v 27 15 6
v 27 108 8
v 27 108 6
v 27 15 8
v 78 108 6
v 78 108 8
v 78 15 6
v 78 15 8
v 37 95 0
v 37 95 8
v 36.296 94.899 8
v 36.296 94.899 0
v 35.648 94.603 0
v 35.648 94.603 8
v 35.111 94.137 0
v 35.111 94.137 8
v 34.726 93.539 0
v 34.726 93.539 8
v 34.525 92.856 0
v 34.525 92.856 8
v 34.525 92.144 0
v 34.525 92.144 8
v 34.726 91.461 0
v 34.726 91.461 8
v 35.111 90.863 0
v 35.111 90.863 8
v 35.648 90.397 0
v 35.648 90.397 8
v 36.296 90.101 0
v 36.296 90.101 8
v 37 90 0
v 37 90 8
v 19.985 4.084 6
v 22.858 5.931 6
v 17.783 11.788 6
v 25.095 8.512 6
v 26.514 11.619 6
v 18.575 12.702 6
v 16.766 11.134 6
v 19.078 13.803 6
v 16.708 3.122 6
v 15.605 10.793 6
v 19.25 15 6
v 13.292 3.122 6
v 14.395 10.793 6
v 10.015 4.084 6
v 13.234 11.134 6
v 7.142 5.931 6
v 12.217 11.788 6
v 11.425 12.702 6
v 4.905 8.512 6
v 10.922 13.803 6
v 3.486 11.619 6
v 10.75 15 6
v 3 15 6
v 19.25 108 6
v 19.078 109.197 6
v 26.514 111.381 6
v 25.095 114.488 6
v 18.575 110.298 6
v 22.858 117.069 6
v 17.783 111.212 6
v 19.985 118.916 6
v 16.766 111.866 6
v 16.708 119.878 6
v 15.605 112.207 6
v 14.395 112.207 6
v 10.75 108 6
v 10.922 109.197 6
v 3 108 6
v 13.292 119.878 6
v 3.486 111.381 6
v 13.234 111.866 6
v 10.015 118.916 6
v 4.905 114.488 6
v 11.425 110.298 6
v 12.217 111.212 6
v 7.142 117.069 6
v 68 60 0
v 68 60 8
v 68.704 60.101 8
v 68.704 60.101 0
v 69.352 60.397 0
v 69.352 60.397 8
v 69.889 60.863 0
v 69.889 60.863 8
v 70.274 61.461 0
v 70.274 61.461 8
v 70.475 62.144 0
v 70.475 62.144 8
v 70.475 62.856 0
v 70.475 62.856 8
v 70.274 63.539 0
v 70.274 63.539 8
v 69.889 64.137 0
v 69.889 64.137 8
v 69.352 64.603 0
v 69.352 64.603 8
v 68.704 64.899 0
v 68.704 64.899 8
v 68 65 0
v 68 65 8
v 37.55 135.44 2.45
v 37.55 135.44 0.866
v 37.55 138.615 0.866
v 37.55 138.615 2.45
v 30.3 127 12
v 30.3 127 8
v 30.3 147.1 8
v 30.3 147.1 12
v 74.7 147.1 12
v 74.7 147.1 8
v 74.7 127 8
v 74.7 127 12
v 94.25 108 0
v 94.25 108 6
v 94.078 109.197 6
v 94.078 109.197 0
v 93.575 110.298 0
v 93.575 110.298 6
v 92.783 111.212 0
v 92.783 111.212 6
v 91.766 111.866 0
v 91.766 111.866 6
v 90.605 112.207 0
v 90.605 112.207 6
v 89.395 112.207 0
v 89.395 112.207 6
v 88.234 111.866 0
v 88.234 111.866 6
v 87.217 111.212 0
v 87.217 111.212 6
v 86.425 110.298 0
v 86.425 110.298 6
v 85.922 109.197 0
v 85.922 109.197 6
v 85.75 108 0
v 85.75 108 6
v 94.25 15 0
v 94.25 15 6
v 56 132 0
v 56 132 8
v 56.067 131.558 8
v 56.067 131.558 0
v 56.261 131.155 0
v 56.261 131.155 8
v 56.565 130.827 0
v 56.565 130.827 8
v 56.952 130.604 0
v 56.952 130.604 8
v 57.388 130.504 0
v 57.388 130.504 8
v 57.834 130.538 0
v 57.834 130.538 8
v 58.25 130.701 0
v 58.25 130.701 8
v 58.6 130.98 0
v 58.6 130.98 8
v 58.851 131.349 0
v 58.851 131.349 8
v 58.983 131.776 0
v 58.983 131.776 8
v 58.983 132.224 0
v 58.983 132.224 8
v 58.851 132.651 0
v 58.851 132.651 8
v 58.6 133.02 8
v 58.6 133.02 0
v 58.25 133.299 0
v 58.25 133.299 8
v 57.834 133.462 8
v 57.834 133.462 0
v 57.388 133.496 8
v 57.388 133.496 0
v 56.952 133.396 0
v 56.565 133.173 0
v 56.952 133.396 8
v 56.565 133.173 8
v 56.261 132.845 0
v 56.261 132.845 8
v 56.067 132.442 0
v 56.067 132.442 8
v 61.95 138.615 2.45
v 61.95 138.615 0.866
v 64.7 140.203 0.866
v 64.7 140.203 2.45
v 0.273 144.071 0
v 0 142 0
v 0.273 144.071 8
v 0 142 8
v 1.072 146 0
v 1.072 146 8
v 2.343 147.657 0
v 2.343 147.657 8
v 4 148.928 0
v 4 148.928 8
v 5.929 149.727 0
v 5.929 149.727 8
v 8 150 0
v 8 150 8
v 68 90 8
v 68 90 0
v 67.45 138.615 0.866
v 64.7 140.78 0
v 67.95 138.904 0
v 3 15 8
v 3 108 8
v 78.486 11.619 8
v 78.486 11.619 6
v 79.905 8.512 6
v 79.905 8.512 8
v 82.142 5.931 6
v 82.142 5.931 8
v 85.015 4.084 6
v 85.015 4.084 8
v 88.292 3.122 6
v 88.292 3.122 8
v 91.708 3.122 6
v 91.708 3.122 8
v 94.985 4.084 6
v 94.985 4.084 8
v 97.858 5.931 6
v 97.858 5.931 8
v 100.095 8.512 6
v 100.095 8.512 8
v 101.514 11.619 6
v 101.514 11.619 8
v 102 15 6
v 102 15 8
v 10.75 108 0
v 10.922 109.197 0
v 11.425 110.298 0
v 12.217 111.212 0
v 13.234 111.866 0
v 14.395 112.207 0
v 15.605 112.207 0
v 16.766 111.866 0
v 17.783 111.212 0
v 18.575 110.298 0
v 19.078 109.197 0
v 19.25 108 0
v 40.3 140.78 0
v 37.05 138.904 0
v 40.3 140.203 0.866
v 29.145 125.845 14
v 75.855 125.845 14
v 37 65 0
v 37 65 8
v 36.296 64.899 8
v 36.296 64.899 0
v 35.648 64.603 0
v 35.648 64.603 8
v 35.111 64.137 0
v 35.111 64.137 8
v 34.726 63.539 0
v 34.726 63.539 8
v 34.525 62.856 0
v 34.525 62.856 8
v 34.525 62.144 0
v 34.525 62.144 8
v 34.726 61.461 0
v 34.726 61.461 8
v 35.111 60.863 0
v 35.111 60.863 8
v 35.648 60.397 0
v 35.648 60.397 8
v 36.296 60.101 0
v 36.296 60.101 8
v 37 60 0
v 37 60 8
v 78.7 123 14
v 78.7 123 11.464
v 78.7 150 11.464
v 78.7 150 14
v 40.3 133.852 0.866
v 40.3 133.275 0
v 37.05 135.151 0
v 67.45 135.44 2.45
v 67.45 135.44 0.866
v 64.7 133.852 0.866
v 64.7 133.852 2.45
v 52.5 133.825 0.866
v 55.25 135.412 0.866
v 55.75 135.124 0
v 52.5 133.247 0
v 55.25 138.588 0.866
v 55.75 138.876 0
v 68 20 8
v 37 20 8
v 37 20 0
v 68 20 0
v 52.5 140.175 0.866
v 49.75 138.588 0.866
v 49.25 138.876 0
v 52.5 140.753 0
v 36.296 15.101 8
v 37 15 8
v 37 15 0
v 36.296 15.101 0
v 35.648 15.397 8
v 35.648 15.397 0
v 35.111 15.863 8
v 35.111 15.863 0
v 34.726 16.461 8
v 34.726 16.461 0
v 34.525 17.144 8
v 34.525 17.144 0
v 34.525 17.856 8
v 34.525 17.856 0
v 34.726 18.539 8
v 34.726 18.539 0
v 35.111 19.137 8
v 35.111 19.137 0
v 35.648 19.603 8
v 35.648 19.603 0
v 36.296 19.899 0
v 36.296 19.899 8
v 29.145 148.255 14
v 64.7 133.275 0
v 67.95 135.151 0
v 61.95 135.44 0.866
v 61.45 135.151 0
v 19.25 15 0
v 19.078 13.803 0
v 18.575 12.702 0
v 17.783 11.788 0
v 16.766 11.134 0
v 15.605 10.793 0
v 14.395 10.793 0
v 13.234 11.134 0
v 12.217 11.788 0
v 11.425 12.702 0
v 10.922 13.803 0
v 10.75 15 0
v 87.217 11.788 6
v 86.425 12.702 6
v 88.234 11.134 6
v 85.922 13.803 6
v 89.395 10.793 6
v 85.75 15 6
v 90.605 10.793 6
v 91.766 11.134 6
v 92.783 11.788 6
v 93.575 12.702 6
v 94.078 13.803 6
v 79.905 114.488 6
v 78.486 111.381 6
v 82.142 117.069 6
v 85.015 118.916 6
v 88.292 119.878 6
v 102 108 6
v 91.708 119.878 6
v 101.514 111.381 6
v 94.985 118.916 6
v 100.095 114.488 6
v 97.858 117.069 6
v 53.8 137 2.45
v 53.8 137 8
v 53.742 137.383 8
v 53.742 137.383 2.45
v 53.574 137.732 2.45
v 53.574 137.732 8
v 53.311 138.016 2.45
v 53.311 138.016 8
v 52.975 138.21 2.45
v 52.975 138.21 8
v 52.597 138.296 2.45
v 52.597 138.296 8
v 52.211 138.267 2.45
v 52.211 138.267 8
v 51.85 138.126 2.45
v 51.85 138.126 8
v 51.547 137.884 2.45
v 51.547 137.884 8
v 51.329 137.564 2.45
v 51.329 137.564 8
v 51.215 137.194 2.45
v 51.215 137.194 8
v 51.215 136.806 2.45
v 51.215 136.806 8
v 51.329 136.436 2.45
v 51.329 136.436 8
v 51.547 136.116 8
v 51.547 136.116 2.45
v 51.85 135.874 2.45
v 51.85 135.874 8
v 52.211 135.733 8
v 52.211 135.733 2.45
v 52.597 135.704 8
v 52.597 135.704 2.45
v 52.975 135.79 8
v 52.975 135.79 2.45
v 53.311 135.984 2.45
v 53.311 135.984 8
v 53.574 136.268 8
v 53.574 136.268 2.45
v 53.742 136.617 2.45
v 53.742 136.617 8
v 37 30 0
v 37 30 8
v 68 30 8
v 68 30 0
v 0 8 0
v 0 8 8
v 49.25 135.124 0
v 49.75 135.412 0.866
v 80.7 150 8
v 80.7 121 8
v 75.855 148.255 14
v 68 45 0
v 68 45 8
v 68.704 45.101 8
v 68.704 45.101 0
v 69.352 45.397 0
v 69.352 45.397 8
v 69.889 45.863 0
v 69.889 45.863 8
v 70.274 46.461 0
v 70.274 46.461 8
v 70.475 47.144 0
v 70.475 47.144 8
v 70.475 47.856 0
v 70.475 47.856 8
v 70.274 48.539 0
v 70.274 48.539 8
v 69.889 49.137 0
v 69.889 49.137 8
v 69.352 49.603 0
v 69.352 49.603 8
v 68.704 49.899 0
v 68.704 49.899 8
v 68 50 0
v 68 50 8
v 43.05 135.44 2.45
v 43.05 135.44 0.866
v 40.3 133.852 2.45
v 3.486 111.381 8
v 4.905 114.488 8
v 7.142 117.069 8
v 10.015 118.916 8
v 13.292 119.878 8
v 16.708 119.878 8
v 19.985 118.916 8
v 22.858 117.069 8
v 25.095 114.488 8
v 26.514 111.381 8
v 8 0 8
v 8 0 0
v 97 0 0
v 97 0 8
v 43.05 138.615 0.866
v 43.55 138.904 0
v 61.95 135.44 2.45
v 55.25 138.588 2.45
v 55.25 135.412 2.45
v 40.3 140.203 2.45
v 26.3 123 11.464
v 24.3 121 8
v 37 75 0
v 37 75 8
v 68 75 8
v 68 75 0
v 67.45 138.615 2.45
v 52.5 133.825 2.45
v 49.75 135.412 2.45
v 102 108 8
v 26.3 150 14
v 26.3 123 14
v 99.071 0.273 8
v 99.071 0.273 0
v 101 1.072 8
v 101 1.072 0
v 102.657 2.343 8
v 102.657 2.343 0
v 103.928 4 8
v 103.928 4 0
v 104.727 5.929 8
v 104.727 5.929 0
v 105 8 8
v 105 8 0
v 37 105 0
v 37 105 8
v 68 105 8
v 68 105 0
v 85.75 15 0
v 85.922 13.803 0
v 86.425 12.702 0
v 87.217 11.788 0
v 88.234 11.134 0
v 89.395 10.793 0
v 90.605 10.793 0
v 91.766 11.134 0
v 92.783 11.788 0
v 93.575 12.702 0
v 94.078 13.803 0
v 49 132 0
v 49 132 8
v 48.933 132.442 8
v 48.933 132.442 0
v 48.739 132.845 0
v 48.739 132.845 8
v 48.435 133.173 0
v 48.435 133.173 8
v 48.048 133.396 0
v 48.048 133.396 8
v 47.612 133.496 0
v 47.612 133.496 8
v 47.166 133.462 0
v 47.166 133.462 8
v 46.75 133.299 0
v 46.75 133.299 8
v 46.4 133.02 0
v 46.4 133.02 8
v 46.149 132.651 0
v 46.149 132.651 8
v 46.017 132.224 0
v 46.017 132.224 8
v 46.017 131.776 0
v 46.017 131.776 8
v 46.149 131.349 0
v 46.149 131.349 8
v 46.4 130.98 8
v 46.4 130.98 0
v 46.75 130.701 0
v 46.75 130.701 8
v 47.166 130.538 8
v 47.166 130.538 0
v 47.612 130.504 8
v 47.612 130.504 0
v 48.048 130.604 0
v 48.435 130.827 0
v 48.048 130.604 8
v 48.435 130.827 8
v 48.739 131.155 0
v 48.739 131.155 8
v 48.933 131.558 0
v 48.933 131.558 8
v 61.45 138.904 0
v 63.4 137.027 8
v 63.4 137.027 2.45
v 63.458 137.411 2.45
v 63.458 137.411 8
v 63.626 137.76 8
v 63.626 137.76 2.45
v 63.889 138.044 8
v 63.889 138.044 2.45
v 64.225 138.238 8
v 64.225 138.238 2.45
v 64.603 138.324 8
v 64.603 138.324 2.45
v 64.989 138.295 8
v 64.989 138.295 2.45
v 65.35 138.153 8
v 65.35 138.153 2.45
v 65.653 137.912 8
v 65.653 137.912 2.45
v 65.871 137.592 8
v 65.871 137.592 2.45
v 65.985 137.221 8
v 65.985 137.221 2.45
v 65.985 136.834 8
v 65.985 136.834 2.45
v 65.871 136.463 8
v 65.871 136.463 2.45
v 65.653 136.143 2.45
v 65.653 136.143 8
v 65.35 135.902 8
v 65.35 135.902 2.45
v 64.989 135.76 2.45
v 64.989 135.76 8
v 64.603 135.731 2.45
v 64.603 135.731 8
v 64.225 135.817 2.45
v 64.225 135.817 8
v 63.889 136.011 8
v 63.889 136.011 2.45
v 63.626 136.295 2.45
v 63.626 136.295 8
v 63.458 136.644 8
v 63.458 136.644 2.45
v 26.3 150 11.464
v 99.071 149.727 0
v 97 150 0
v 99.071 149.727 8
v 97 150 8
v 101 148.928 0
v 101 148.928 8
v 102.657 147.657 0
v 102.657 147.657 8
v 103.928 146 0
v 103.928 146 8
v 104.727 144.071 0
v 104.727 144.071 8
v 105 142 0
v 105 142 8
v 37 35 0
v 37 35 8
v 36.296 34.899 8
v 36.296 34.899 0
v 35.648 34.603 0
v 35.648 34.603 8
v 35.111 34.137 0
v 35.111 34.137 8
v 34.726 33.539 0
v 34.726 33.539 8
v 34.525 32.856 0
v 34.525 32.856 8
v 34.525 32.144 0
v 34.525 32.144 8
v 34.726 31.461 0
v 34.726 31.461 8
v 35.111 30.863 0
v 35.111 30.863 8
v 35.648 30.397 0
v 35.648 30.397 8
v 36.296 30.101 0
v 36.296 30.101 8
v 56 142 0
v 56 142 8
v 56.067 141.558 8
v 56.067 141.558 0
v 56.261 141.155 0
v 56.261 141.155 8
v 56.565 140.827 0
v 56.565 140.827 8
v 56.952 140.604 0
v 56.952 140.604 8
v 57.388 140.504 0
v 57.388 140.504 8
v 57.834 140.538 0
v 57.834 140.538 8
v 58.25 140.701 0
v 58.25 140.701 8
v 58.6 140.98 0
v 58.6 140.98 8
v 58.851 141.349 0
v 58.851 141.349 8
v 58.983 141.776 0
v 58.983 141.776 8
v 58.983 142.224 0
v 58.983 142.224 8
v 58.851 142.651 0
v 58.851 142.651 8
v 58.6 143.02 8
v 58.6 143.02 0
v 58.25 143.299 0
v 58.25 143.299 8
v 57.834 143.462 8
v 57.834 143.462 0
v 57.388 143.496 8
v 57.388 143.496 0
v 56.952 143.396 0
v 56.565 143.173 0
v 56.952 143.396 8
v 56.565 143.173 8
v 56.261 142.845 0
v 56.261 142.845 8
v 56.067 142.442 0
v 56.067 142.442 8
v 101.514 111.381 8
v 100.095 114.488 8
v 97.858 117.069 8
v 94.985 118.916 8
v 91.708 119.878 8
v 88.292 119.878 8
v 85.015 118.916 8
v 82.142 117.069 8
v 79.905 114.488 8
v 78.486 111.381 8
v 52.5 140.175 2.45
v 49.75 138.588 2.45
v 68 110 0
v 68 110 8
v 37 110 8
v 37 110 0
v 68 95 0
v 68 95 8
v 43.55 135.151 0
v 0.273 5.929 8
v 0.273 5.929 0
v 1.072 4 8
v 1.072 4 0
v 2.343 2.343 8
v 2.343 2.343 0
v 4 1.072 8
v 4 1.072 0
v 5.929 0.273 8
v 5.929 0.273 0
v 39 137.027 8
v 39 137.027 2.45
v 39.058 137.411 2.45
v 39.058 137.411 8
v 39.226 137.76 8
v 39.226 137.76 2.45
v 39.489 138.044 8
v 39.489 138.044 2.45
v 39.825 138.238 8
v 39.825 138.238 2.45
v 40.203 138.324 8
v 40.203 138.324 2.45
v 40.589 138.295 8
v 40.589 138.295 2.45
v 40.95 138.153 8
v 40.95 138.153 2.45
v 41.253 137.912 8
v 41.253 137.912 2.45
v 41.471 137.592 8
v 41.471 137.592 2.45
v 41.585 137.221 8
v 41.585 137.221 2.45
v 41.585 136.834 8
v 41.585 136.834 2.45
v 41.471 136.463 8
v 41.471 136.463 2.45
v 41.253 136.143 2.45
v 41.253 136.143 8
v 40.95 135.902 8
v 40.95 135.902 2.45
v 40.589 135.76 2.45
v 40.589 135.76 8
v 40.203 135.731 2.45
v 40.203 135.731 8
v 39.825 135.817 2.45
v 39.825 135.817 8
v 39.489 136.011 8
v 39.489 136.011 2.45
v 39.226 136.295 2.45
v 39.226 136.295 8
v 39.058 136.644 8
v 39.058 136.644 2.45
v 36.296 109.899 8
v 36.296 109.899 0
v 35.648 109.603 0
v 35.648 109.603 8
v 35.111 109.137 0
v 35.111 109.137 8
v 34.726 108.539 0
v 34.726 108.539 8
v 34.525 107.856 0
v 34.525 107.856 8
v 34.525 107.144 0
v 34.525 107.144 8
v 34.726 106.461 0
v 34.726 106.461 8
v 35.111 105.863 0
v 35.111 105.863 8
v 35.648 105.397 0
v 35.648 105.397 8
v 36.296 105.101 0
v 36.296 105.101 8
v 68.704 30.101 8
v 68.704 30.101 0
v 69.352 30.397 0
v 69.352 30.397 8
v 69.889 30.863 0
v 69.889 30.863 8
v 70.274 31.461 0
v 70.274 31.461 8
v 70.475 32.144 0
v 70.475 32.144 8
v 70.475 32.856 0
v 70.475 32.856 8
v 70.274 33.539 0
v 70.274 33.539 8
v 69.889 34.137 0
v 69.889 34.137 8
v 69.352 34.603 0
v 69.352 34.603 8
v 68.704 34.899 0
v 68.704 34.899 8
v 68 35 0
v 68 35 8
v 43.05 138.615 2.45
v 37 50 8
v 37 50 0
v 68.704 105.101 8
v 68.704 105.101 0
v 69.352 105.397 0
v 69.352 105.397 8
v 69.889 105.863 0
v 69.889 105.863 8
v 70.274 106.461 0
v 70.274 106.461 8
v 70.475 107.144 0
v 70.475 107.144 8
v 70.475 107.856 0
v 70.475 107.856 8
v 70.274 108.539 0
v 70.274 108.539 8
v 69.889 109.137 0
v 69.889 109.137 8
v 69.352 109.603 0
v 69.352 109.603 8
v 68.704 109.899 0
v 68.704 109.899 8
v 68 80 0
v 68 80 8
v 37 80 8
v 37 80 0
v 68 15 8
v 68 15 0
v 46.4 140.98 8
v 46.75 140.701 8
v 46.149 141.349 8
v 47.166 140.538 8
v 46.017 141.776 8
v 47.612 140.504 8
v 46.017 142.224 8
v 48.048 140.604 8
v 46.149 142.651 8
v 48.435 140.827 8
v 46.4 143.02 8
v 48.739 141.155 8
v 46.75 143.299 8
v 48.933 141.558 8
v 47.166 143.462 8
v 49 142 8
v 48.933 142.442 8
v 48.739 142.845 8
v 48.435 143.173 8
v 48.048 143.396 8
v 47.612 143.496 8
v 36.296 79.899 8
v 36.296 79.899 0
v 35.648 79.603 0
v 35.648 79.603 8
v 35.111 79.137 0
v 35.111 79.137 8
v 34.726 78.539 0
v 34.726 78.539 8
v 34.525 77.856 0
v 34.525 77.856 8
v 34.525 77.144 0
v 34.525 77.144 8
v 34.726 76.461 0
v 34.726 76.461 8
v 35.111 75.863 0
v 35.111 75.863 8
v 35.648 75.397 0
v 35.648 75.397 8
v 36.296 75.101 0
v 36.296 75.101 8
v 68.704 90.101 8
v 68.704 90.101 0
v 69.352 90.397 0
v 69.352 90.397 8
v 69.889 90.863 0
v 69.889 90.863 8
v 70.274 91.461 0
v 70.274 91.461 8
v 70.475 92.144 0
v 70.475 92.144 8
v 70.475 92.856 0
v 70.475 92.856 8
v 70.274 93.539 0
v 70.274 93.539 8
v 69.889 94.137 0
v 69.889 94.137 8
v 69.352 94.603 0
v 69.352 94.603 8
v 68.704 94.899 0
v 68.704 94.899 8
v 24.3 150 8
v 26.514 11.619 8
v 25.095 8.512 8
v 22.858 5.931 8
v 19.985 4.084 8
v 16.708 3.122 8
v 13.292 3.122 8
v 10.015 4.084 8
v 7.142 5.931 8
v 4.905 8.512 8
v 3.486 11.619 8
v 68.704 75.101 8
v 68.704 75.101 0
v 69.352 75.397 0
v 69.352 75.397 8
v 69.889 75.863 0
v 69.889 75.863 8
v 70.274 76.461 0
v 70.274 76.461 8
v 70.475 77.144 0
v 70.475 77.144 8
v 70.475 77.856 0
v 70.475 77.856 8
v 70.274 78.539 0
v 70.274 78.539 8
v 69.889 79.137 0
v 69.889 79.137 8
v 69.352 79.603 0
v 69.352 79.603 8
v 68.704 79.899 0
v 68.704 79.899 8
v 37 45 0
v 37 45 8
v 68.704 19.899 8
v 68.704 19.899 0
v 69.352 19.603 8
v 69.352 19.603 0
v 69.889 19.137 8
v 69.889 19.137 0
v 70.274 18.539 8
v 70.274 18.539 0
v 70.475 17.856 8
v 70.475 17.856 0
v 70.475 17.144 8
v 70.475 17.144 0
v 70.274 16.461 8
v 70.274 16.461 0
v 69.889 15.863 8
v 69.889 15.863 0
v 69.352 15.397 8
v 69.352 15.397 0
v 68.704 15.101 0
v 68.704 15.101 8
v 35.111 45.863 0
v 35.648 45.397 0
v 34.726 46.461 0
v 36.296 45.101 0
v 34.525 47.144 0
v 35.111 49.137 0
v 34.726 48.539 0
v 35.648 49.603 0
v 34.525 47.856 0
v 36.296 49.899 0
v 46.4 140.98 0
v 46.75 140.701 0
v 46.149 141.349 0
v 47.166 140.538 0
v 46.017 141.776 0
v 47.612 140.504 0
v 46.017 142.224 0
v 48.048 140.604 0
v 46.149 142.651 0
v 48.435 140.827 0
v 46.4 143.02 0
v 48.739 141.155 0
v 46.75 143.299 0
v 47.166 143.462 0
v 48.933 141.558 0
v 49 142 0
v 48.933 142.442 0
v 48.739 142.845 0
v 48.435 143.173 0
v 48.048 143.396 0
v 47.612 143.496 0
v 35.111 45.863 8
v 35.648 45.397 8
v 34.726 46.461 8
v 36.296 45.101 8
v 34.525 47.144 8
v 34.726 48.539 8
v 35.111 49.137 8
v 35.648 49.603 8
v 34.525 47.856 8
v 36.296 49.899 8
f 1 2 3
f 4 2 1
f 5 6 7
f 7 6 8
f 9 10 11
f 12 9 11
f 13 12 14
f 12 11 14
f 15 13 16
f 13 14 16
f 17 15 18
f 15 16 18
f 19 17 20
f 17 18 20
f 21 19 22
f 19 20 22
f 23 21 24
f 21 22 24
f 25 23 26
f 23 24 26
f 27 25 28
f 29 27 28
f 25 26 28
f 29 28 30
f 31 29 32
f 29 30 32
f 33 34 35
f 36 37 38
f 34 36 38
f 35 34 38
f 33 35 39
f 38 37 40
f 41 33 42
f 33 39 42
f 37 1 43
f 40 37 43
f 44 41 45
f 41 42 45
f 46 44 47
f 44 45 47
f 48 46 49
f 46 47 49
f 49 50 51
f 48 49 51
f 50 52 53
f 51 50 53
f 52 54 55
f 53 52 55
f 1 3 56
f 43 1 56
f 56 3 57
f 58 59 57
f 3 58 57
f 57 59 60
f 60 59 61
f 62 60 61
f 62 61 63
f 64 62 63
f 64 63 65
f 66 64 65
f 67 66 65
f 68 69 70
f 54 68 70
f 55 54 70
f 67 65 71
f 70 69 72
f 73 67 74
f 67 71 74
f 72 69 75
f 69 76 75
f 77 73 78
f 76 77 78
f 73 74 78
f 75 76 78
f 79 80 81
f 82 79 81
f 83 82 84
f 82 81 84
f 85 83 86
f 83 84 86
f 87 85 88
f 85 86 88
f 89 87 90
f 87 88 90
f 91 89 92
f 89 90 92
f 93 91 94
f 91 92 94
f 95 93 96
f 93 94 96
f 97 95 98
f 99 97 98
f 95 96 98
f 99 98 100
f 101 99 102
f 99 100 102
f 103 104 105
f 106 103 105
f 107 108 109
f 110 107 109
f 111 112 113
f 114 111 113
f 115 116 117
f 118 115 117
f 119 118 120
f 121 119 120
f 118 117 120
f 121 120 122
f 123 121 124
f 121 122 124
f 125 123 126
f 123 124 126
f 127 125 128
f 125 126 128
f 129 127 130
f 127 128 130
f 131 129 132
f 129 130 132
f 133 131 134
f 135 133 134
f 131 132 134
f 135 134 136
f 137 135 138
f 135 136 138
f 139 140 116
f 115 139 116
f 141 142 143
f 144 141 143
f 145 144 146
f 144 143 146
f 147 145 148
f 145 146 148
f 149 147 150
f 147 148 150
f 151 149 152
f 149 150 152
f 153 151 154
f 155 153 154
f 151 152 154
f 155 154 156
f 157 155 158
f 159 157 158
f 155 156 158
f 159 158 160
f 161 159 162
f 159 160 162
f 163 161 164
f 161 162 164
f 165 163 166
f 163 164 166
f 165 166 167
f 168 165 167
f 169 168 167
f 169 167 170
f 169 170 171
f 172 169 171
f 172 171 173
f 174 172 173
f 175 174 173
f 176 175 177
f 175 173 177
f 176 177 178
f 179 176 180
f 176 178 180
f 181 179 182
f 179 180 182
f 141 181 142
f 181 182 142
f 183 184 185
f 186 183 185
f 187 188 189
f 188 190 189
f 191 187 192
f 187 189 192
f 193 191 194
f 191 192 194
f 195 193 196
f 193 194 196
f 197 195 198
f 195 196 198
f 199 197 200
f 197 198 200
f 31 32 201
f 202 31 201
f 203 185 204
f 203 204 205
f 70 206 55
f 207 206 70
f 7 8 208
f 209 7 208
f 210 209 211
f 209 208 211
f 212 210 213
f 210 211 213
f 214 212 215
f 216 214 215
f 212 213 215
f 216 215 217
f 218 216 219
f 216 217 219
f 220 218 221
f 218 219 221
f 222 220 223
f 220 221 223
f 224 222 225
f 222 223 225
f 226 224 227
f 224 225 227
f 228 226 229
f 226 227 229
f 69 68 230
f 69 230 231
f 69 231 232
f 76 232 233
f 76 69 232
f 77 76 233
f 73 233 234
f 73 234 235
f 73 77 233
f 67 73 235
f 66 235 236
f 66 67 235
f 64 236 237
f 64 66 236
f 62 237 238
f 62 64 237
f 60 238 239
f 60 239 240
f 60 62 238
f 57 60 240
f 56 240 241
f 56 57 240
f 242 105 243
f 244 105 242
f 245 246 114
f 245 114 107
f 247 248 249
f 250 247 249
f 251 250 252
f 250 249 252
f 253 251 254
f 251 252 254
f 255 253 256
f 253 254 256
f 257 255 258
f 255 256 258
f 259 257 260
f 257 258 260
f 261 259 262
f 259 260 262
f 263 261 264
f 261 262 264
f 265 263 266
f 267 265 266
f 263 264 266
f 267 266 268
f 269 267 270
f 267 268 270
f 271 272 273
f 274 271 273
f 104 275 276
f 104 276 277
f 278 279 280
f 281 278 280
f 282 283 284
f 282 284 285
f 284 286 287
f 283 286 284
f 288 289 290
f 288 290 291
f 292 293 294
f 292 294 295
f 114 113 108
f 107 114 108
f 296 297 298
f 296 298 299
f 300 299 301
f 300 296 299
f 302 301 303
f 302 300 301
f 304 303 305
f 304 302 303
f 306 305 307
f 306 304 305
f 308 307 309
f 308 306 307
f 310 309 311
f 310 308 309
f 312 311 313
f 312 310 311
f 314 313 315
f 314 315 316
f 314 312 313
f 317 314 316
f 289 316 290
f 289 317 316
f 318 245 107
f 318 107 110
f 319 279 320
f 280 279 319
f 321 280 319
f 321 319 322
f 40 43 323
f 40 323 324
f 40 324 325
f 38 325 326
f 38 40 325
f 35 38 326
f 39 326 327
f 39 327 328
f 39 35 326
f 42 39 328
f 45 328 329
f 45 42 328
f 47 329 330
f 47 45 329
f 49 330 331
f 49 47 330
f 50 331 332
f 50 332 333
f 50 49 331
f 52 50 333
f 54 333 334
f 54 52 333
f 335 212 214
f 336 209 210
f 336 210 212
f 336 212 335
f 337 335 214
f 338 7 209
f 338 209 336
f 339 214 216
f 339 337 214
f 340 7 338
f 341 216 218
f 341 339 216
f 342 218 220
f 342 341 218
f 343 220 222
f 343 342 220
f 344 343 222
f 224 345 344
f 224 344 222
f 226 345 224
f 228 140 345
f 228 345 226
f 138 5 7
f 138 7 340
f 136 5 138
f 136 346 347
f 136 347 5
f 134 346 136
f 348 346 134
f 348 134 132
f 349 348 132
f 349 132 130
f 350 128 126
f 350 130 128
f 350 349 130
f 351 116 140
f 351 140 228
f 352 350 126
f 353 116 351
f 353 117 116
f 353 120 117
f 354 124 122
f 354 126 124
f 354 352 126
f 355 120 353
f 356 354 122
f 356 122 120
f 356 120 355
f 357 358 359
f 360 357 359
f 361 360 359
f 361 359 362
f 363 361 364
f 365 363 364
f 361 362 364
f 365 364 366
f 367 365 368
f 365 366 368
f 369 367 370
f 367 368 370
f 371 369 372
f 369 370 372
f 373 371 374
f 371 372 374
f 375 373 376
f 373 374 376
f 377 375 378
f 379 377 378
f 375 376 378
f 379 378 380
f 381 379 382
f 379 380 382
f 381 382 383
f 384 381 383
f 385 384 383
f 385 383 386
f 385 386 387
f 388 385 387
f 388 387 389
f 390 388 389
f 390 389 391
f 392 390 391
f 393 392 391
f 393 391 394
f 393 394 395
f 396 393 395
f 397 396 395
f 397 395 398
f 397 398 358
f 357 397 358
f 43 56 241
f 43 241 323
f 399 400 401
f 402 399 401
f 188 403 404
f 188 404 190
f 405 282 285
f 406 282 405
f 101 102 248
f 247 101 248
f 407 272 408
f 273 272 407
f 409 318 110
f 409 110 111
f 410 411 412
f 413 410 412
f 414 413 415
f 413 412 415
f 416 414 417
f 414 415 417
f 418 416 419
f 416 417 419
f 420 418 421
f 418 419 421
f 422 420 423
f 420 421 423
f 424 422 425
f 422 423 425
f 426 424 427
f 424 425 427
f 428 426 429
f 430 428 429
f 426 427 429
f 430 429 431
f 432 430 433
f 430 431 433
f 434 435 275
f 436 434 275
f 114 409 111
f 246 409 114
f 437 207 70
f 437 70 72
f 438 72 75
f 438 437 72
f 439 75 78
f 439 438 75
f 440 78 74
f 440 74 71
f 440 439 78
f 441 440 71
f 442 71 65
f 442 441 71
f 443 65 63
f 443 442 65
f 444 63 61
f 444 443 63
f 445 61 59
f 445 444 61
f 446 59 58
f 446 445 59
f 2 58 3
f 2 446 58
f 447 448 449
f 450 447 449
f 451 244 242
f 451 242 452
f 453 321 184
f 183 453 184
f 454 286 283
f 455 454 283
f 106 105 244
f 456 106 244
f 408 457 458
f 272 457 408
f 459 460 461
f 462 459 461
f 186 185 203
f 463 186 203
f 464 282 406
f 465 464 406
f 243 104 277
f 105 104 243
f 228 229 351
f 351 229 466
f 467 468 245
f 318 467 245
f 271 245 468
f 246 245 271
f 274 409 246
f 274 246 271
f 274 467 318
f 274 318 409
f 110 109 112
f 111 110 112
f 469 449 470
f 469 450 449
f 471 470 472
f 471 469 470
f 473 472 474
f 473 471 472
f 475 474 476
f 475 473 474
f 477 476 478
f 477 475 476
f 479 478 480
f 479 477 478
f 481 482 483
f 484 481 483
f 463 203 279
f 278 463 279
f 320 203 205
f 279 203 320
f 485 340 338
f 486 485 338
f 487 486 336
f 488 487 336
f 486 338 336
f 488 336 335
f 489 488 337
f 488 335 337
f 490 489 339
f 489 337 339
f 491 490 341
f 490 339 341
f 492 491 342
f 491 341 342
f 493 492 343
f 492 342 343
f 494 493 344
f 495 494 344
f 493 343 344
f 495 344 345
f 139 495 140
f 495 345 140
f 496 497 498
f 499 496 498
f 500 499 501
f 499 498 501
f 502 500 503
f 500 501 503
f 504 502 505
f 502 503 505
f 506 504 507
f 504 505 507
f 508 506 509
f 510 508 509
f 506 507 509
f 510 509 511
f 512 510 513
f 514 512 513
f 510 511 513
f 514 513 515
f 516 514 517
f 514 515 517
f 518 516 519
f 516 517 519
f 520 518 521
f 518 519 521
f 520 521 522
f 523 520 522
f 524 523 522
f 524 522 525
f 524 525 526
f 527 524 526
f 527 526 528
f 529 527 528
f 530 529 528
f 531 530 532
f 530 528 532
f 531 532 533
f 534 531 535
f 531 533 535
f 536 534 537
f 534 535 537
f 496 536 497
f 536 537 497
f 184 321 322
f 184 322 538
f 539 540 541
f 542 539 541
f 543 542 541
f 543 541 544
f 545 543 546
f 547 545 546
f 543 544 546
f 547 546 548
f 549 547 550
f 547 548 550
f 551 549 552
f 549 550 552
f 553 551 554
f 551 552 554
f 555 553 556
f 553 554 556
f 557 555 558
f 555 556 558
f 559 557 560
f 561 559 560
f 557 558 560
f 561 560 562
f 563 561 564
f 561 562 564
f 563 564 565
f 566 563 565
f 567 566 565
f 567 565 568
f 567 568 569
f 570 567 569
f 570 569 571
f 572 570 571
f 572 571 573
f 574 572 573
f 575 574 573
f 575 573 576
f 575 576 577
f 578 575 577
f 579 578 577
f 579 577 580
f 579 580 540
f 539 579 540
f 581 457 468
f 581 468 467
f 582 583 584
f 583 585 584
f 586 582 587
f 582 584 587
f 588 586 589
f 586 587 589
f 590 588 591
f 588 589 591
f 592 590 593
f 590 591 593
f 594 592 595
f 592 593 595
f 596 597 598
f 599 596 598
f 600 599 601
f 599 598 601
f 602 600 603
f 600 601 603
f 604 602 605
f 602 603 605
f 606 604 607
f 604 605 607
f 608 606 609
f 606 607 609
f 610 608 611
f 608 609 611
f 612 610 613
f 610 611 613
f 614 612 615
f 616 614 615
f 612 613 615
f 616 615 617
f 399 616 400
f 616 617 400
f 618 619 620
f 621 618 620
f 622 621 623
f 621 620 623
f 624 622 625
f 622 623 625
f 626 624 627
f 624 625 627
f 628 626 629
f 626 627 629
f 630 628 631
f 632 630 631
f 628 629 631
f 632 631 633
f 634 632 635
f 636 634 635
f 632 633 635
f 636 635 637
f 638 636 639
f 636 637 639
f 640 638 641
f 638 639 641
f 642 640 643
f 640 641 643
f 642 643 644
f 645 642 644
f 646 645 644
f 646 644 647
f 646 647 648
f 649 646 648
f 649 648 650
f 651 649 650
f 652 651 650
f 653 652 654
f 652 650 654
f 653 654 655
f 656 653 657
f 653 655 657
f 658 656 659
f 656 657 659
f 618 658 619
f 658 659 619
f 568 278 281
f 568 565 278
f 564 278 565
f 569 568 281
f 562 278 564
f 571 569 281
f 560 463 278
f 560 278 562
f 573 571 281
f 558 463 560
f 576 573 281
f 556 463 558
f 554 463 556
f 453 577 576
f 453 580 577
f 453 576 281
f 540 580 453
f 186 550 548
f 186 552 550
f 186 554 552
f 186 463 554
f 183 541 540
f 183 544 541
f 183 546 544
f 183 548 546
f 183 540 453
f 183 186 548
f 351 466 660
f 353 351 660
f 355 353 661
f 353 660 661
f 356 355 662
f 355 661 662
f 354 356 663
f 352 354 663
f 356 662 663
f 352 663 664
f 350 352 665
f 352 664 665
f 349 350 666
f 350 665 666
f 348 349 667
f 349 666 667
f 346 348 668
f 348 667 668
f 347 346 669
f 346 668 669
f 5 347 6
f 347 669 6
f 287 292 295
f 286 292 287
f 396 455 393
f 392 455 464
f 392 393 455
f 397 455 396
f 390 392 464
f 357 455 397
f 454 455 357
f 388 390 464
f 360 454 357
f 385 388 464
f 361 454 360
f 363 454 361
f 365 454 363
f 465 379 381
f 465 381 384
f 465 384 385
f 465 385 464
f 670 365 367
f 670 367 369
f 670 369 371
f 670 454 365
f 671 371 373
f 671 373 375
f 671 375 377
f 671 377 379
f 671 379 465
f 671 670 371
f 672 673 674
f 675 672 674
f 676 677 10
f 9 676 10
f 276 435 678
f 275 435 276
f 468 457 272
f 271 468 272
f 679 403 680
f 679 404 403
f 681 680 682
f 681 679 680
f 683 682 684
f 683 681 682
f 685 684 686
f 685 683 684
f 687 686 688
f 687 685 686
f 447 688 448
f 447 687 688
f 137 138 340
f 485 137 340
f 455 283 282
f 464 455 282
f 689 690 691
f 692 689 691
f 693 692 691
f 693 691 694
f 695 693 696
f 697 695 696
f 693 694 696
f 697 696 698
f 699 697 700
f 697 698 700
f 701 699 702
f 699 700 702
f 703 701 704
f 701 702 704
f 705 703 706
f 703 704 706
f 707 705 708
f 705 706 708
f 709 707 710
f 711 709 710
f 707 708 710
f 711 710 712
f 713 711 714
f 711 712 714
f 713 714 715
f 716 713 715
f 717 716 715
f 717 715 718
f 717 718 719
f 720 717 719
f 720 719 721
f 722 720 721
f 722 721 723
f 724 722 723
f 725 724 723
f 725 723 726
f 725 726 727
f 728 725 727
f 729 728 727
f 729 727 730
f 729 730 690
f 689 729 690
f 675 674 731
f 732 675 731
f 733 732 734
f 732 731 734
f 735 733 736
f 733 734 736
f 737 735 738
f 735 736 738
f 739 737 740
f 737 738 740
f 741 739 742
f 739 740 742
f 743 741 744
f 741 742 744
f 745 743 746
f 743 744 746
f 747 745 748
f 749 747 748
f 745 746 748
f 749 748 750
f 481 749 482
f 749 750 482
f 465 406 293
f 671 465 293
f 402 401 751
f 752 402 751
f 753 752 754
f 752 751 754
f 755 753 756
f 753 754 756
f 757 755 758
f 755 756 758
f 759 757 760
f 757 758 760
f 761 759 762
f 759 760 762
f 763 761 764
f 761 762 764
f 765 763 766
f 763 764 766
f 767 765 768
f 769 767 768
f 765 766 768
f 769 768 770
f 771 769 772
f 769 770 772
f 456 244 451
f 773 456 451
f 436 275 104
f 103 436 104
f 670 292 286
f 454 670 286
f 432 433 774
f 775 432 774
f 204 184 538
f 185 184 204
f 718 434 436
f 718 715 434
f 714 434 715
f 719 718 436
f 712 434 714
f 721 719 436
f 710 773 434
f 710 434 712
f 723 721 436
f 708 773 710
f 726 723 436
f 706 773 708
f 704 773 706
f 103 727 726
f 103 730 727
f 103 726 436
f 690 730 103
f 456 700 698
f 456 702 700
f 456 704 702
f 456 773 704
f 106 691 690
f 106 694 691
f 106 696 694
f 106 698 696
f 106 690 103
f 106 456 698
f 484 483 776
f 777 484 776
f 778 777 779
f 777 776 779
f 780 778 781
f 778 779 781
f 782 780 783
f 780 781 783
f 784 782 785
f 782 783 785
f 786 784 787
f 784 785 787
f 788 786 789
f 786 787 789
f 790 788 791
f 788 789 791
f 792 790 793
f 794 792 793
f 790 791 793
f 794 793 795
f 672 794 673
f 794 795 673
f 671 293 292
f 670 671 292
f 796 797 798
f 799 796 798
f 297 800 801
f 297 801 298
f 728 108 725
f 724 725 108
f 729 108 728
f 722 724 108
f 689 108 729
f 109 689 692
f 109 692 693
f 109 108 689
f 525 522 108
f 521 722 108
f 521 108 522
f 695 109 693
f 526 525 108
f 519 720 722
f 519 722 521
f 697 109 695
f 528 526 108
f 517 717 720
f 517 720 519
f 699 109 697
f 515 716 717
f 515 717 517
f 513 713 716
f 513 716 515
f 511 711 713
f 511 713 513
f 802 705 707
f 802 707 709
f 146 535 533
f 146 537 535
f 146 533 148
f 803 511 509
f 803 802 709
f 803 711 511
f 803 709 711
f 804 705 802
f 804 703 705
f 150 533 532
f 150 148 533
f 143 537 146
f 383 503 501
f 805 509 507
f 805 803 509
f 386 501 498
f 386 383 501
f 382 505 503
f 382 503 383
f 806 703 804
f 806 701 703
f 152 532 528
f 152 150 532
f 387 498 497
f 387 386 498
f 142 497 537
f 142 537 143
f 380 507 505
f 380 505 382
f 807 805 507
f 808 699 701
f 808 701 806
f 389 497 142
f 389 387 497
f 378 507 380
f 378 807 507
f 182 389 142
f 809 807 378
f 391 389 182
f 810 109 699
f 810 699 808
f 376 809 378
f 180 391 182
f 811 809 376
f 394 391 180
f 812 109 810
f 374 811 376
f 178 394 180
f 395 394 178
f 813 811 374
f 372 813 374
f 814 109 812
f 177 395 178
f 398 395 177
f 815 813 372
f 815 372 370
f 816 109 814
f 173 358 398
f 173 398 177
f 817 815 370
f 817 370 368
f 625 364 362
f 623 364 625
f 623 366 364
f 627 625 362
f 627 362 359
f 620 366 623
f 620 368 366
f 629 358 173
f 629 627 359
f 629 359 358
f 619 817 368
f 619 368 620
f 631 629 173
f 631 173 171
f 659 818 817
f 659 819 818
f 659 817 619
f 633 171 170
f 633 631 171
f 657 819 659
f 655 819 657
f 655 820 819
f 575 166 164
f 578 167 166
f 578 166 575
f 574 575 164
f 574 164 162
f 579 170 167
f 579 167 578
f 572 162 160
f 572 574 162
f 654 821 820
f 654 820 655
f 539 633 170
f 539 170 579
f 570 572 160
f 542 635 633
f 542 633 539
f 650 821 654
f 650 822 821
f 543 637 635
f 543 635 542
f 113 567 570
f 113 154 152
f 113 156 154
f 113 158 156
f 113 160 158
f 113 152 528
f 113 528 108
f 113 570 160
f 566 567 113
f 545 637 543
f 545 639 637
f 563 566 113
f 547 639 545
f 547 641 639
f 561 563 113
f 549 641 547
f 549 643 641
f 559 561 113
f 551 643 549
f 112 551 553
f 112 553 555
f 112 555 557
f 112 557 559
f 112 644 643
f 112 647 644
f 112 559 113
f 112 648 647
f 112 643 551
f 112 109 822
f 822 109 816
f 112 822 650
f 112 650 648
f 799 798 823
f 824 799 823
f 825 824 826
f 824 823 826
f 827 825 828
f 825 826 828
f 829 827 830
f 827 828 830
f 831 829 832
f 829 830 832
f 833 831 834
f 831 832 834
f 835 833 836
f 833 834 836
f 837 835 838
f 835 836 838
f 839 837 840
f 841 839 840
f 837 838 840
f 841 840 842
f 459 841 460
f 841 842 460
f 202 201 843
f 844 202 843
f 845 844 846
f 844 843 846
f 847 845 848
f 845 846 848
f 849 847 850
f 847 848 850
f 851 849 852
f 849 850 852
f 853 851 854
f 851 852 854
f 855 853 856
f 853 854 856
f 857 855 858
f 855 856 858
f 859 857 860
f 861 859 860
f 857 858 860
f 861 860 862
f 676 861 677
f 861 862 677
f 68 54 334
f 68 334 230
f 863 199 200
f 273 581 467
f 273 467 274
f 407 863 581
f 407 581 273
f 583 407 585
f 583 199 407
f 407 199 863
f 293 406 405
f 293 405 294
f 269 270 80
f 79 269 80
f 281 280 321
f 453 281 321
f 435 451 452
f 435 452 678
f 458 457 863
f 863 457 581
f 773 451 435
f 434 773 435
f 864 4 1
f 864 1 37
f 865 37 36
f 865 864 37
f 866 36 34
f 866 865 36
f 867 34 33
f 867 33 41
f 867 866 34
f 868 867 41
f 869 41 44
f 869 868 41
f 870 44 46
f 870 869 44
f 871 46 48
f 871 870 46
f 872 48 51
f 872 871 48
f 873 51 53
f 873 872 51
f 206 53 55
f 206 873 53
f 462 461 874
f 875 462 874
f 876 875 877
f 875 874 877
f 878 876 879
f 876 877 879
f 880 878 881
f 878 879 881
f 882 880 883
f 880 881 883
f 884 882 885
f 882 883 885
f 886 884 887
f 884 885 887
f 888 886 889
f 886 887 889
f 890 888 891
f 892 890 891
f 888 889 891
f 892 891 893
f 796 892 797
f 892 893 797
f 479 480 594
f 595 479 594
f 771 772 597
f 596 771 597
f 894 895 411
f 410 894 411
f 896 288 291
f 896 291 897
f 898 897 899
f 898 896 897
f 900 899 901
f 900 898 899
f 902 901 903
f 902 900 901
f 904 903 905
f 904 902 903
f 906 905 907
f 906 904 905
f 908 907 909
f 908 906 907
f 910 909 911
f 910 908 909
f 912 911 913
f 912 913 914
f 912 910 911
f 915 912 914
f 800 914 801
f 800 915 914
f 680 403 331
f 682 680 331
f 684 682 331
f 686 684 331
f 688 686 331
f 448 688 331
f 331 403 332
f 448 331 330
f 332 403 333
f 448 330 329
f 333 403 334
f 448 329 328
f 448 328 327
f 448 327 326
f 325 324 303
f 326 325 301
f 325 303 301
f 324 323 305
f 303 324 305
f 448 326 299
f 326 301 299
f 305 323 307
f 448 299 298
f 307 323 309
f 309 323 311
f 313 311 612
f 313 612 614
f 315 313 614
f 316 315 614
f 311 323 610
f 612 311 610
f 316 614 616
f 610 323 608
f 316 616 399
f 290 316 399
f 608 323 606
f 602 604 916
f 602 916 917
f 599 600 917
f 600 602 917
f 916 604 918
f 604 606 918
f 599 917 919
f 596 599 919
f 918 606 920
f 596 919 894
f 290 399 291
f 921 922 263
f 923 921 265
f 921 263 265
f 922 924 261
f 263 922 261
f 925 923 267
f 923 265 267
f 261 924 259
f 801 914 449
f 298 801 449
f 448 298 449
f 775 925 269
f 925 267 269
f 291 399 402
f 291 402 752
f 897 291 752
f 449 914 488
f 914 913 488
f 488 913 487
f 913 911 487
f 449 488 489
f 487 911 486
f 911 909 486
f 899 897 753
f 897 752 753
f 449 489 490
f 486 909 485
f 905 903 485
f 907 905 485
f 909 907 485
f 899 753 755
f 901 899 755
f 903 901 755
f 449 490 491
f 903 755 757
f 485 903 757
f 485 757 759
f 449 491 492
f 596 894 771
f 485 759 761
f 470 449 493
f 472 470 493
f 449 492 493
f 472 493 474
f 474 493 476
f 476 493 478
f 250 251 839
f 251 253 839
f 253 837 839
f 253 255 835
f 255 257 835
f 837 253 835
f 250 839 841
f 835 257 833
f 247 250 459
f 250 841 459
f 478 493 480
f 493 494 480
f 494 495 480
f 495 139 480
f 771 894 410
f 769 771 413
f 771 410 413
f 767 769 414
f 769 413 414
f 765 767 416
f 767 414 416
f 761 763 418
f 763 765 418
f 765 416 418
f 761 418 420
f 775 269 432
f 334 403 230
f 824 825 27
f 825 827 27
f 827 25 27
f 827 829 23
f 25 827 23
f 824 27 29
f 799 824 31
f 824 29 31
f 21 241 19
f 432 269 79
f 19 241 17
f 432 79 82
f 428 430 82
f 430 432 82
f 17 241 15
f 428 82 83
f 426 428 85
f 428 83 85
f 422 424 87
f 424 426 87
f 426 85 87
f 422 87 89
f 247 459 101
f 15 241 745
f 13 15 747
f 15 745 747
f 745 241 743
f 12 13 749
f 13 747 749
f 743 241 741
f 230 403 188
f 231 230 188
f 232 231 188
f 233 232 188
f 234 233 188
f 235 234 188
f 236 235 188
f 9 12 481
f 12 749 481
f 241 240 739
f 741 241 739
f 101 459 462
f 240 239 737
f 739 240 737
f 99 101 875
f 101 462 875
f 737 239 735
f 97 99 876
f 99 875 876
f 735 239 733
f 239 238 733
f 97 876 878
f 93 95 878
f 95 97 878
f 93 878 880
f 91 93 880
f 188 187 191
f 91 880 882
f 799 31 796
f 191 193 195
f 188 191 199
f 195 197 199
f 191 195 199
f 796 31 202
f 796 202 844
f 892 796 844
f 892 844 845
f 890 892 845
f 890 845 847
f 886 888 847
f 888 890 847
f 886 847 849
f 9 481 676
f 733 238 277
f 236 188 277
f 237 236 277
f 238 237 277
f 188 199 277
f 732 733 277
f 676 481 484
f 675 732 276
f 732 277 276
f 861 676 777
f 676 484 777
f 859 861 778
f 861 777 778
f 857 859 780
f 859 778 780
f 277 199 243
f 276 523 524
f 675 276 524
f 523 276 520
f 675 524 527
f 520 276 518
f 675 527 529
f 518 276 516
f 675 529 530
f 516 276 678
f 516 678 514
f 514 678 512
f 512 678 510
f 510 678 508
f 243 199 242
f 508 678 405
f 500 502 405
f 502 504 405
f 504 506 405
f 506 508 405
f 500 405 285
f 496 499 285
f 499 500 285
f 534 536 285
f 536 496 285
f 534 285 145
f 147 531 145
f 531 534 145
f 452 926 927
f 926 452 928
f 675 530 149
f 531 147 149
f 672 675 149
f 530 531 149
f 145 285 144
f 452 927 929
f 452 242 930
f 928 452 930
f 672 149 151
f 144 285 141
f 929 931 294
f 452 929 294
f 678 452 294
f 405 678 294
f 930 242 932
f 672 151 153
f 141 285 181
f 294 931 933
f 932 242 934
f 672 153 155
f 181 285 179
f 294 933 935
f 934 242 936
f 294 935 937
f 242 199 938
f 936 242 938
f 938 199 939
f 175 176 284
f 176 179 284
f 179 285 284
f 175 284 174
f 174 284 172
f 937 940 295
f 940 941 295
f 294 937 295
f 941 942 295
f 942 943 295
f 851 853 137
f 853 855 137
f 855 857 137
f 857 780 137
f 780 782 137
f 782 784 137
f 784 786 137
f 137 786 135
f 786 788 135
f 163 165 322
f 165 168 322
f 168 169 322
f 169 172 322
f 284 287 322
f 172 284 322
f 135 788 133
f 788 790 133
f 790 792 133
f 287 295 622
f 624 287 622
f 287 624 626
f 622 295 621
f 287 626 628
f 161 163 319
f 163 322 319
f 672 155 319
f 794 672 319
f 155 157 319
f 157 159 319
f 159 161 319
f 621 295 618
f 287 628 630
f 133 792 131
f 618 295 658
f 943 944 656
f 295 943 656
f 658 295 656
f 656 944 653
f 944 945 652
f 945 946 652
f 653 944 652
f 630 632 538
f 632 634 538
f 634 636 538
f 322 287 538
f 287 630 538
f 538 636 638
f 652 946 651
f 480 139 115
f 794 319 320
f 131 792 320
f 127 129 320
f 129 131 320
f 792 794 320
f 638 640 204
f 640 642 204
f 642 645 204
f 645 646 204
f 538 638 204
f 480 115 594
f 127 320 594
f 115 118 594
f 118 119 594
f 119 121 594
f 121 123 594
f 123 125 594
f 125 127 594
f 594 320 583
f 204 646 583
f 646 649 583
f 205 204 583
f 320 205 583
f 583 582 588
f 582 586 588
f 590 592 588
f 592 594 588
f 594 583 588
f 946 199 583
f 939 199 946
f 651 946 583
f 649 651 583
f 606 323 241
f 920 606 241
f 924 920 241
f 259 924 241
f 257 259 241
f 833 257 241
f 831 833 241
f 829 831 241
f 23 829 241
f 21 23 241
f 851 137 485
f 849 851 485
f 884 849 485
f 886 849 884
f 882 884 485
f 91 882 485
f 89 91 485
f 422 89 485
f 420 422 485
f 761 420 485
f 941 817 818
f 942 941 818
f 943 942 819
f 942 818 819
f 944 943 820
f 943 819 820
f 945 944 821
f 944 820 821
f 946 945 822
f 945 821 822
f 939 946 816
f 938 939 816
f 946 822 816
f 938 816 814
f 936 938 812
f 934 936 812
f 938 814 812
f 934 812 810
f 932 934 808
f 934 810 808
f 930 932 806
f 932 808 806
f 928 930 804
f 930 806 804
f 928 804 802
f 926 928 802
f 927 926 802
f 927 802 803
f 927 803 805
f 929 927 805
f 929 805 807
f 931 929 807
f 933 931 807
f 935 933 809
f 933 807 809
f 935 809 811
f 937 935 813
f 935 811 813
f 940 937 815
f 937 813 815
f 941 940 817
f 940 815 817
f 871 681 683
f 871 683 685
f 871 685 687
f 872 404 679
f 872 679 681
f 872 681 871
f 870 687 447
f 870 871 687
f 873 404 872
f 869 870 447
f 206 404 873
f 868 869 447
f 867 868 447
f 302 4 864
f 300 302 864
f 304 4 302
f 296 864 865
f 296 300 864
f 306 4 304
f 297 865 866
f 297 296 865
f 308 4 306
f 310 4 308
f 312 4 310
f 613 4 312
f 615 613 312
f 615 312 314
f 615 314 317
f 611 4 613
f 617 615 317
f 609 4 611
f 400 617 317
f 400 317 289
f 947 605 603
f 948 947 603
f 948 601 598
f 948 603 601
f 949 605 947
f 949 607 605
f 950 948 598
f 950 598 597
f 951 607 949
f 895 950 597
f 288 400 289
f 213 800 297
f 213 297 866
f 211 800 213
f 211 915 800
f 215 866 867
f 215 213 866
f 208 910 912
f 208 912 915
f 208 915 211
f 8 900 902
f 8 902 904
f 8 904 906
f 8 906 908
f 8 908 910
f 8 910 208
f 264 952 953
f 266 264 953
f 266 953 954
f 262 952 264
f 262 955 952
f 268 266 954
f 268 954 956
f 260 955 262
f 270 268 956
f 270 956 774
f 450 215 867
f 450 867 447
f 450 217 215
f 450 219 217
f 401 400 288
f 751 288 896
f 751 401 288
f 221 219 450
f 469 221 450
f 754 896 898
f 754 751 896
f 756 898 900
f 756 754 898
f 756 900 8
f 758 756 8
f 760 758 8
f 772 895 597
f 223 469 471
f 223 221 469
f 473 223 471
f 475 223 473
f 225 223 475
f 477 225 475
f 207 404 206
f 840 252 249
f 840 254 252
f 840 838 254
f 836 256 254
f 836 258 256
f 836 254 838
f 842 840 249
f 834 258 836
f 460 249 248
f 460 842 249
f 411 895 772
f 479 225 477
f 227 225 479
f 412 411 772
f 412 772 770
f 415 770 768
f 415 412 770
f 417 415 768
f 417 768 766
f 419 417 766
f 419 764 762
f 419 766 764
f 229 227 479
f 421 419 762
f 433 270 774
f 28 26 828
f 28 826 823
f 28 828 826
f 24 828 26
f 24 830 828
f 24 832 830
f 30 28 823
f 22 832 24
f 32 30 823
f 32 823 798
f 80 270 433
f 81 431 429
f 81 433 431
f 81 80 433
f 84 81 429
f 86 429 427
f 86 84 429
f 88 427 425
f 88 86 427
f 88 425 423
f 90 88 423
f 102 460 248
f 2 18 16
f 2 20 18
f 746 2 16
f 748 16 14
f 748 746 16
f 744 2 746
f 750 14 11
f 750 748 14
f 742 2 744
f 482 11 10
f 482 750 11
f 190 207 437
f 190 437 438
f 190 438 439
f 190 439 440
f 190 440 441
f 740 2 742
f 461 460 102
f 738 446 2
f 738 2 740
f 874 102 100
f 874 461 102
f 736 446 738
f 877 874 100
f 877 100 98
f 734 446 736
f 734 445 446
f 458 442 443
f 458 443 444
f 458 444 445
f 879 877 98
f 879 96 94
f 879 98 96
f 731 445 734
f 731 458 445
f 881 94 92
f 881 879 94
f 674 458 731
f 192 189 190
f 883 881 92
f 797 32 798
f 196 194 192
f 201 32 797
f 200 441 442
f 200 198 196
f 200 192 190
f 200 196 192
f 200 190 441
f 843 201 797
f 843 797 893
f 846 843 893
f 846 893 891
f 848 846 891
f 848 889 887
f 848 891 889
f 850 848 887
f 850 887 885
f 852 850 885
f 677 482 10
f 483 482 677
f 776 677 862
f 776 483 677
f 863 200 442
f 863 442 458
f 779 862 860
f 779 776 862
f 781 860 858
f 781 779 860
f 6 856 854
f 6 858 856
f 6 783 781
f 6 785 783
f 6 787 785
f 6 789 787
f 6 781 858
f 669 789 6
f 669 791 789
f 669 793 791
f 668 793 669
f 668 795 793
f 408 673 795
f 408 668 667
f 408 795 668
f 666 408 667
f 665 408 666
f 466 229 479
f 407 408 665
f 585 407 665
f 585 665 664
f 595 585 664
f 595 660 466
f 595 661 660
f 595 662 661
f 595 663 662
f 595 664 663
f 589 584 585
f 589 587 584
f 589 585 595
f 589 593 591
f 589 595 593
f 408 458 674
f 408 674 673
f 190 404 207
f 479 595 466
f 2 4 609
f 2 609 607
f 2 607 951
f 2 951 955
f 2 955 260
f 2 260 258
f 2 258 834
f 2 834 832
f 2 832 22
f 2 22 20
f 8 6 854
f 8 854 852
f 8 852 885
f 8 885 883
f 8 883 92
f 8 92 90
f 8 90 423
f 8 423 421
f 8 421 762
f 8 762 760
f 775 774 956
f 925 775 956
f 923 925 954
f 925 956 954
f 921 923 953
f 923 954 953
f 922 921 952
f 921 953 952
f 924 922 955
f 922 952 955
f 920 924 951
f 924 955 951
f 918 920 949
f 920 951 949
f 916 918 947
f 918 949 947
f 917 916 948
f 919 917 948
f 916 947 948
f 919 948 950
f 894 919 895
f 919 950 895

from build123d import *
from OCP.BRepFilletAPI import BRepFilletAPI_MakeChamfer

# Parameters (mm, degrees)
CROQUIS1_W              = 105
CROQUIS1_H              = 150
SALIENTE_EXTRUIR1_DEPTH = 8
CROQUIS2_R              = 1.3
CROQUIS2_R_2            = 1.5
CORTAR_EXTRUIR4_DEPTH   = 8
CROQUIS3_W              = 52.4
CROQUIS3_H              = 27
SALIENTE_EXTRUIR2_DEPTH = 6
REDONDEO1_R             = 8
REDONDEO2_R             = 8
REDONDEO3_R             = 8
REDONDEO4_R             = 8
CORTAR_EXTRUIR5_DEPTH   = 2
CHAFL_N1_SIZE           = 2
CHAFL_N1_SIZE2          = 1.154700538
CHAFL_N2_SIZE           = 2
CHAFL_N2_SIZE2          = 3.464101615
CORTAR_EXTRUIR6_DEPTH   = 8
CORTAR_EXTRUIR7_DEPTH   = 2.45
CHAFL_N3_SIZE           = 0.5
CHAFL_N3_SIZE2          = 0.866025404
CROQUIS9_R              = 1.3
CORTAR_EXTRUIR9_DEPTH   = 8


with BuildPart() as part:
    # Croquis1 → Saliente-Extruir1 (new body)
    with BuildSketch(Plane.XY):
        with Locations((52.5, 75)):
            Rectangle(CROQUIS1_W, CROQUIS1_H)
    extrude(amount=SALIENTE_EXTRUIR1_DEPTH)

    # Croquis2 → Cortar-Extruir4 (cut)
    with BuildSketch(Plane.XY.offset(8)):
        with Locations((52.5, 137)):
            Circle(CROQUIS2_R)
        with Locations((47.5, 142)):
            Circle(CROQUIS2_R_2)
        with Locations((47.5, 132)):
            Circle(CROQUIS2_R_2)
        with Locations(Location((57.5, 132, 0), (0, 0, 180))):
            Circle(CROQUIS2_R_2)
        with Locations(Location((57.5, 142, 0), (0, 0, 180))):
            Circle(CROQUIS2_R_2)
        with BuildLine():
            Line((19.25, 108), (19.25, 15))
            ThreePointArc((19.25, 15), (15, 10.75), (10.75, 15))
            Line((10.75, 15), (10.75, 108))
            ThreePointArc((10.75, 108), (15, 112.25), (19.25, 108))
        make_face()
        with BuildLine():
            Line((85.75, 108), (85.75, 15))
            ThreePointArc((85.75, 15), (90, 10.75), (94.25, 15))
            Line((94.25, 15), (94.25, 108))
            ThreePointArc((94.25, 108), (90, 112.25), (85.75, 108))
        make_face()
    extrude(amount=-CORTAR_EXTRUIR4_DEPTH, mode=Mode.SUBTRACT)

    # Croquis3 → Saliente-Extruir2 (add)
    with BuildSketch(Plane.XY.offset(8)):
        with Locations((52.5, 136.5)):
            Rectangle(CROQUIS3_W, CROQUIS3_H)
        Polygon((74.7, 127), (52.5, 127), (30.3, 127), (30.3, 147.1), (74.7, 147.1), align=None, mode=Mode.SUBTRACT)
    extrude(amount=SALIENTE_EXTRUIR2_DEPTH)

    # Redondeo1
    redondeo1_edges = [part.edges().sort_by_distance(p)[0] for p in [
        (0, 150, 4),
    ]]
    fillet(redondeo1_edges, radius=REDONDEO1_R)

    # Redondeo2
    redondeo2_edges = [part.edges().sort_by_distance(p)[0] for p in [
        (105, 150, 4),
    ]]
    fillet(redondeo2_edges, radius=REDONDEO2_R)

    # Redondeo3
    redondeo3_edges = [part.edges().sort_by_distance(p)[0] for p in [
        (0, 0, 4),
    ]]
    fillet(redondeo3_edges, radius=REDONDEO3_R)

    # Redondeo4
    redondeo4_edges = [part.edges().sort_by_distance(p)[0] for p in [
        (105, 0, 4),
    ]]
    fillet(redondeo4_edges, radius=REDONDEO4_R)

    # Croquis4 → Cortar-Extruir5 (cut)
    # profile 1 of 2: a face of its own
    with BuildSketch(Plane.XY.offset(8)):
        with BuildLine():
            Line((27, 108), (27, 15))
            ThreePointArc((27, 15), (15, 3), (3, 15))
            Line((3, 15), (3, 108))
            ThreePointArc((3, 108), (15, 120), (27, 108))
        make_face()
        with BuildLine():
            Line((10.75, 108), (10.75, 15))
            ThreePointArc((10.75, 15), (15, 10.75), (19.25, 15))
            Line((19.25, 15), (19.25, 108))
            ThreePointArc((19.25, 108), (15, 112.25), (10.75, 108))
        make_face(mode=Mode.SUBTRACT)
    # profile 2 of 2: a face of its own
    with BuildSketch(Plane.XY.offset(8)):
        with BuildLine():
            Line((78, 108), (78, 15))
            ThreePointArc((78, 15), (90, 3), (102, 15))
            Line((102, 15), (102, 108))
            ThreePointArc((102, 108), (90, 120), (78, 108))
        make_face()
        with BuildLine():
            Line((85.75, 108), (85.75, 15))
            ThreePointArc((85.75, 15), (90, 10.75), (94.25, 15))
            Line((94.25, 15), (94.25, 108))
            ThreePointArc((94.25, 108), (90, 112.25), (85.75, 108))
        make_face(mode=Mode.SUBTRACT)
    extrude(amount=-CORTAR_EXTRUIR5_DEPTH, mode=Mode.SUBTRACT)

    # Chaflán1: one chamfer whose edges measure the first distance from different faces: ONE call of the kernel's chamfer builder (chamfer() names one face for all edges)
    chafl_n1_edges_1 = [part.edges().sort_by_distance(p)[0] for p in [
        (52.5, 127, 14),
    ]]
    chafl_n1_side_1 = [part.faces().sort_by_distance(p)[0] for p in [
        (52.5, 127, 11),
    ]]
    chafl_n1_edges_2 = [part.edges().sort_by_distance(p)[0] for p in [
        (30.3, 137.05, 14),
    ]]
    chafl_n1_side_2 = [part.faces().sort_by_distance(p)[0] for p in [
        (30.3, 137.05, 11),
    ]]
    chafl_n1_edges_3 = [part.edges().sort_by_distance(p)[0] for p in [
        (52.5, 147.1, 14),
    ]]
    chafl_n1_side_3 = [part.faces().sort_by_distance(p)[0] for p in [
        (52.5, 147.1, 11),
    ]]
    chafl_n1_edges_4 = [part.edges().sort_by_distance(p)[0] for p in [
        (74.7, 137.05, 14),
    ]]
    chafl_n1_side_4 = [part.faces().sort_by_distance(p)[0] for p in [
        (74.7, 137.05, 11),
    ]]
    chafl_n1 = BRepFilletAPI_MakeChamfer(part.part.solid().wrapped)
    for e in chafl_n1_edges_1:
        chafl_n1.Add(CHAFL_N1_SIZE, CHAFL_N1_SIZE2, e.wrapped, chafl_n1_side_1[0].wrapped)  # the first distance lies on this face
    for e in chafl_n1_edges_2:
        chafl_n1.Add(CHAFL_N1_SIZE, CHAFL_N1_SIZE2, e.wrapped, chafl_n1_side_2[0].wrapped)  # the first distance lies on this face
    for e in chafl_n1_edges_3:
        chafl_n1.Add(CHAFL_N1_SIZE, CHAFL_N1_SIZE2, e.wrapped, chafl_n1_side_3[0].wrapped)  # the first distance lies on this face
    for e in chafl_n1_edges_4:
        chafl_n1.Add(CHAFL_N1_SIZE, CHAFL_N1_SIZE2, e.wrapped, chafl_n1_side_4[0].wrapped)  # the first distance lies on this face
    add(Compound.cast(chafl_n1.Shape()), mode=Mode.REPLACE)

    # Chaflán2
    chafl_n2_edges = [part.edges().sort_by_distance(p)[0] for p in [
        (52.5, 123, 8),
        (78.7, 136.5, 8),
        (26.3, 136.5, 8),
    ]]
    chafl_n2_side = [part.faces().sort_by_distance(p)[0] for p in [
        (52.5, 73.36933007, 8),
    ]]
    chamfer(chafl_n2_edges, length=CHAFL_N2_SIZE, length2=CHAFL_N2_SIZE2, reference=chafl_n2_side[0])

    # Croquis6 → Cortar-Extruir6 (cut)
    with BuildSketch(Plane.XY.offset(8)):
        with BuildLine():
            Line((37, 20), (68, 20))
            ThreePointArc((68, 20), (70.5, 17.5), (68, 15))
            Line((68, 15), (37, 15))
            ThreePointArc((37, 15), (34.5, 17.5), (37, 20))
        make_face()
        with BuildLine():
            Line((37, 30), (68, 30))
            ThreePointArc((68, 30), (70.5, 32.5), (68, 35))
            Line((68, 35), (37, 35))
            ThreePointArc((37, 35), (34.5, 32.5), (37, 30))
        make_face()
        with BuildLine():
            Line((37, 45), (68, 45))
            ThreePointArc((68, 45), (70.5, 47.5), (68, 50))
            Line((68, 50), (37, 50))
            ThreePointArc((37, 50), (34.5, 47.5), (37, 45))
        make_face()
        with BuildLine():
            Line((37, 60), (68, 60))
            ThreePointArc((68, 60), (70.5, 62.5), (68, 65))
            Line((68, 65), (37, 65))
            ThreePointArc((37, 65), (34.5, 62.5), (37, 60))
        make_face()
        with BuildLine():
            Line((37, 75), (68, 75))
            ThreePointArc((68, 75), (70.5, 77.5), (68, 80))
            Line((68, 80), (37, 80))
            ThreePointArc((37, 80), (34.5, 77.5), (37, 75))
        make_face()
        with BuildLine():
            Line((37, 90), (68, 90))
            ThreePointArc((68, 90), (70.5, 92.5), (68, 95))
            Line((68, 95), (37, 95))
            ThreePointArc((37, 95), (34.5, 92.5), (37, 90))
        make_face()
        with BuildLine():
            Line((37, 105), (68, 105))
            ThreePointArc((68, 105), (70.5, 107.5), (68, 110))
            Line((68, 110), (37, 110))
            ThreePointArc((37, 110), (34.5, 107.5), (37, 105))
        make_face()
    extrude(amount=-CORTAR_EXTRUIR6_DEPTH, mode=Mode.SUBTRACT)

    # Croquis8 → Cortar-Extruir7 (cut)
    with BuildSketch(Plane(origin=(0, 0, 0), x_dir=(-1, 0, 0), z_dir=(0, 0, -1))):
        Polygon((-52.5, 140.175426481), (-55.25, 138.58771324), (-55.25, 135.41228676), (-52.5, 133.824573519), (-49.75, 135.41228676), (-49.75, 138.58771324), align=None)
        Polygon((-64.7, 140.202903958), (-67.45, 138.615190718), (-67.45, 135.439764237), (-64.7, 133.852050997), (-61.95, 135.439764237), (-61.95, 138.615190718), align=None)
        Polygon((-37.55, 138.615190718), (-40.3, 140.202903958), (-43.05, 138.615190718), (-43.05, 135.439764237), (-40.3, 133.852050997), (-37.55, 135.439764237), align=None)
    extrude(amount=-CORTAR_EXTRUIR7_DEPTH, mode=Mode.SUBTRACT)

    # Chaflán3
    chafl_n3_edges = [part.edges().sort_by_distance(p)[0] for p in [
        (66.075, 134.645907617, 0),
        (63.325, 134.645907617, 0),
        (61.95, 137.027477477, 0),
        (63.325, 139.409047338, 0),
        (66.075, 139.409047338, 0),
        (67.45, 137.027477477, 0),
        (41.675, 139.409047338, 0),
        (43.05, 137.027477477, 0),
        (41.675, 134.645907617, 0),
        (38.925, 134.645907617, 0),
        (37.55, 137.027477477, 0),
        (38.925, 139.409047338, 0),
        (49.75, 137, 0),
        (51.125, 139.38156986, 0),
        (53.875, 139.38156986, 0),
        (55.25, 137, 0),
        (53.875, 134.61843014, 0),
        (51.125, 134.61843014, 0),
    ]]
    chafl_n3_side = [part.faces().sort_by_distance(p)[0] for p in [
        (52.5, 1.830983342, 0),
    ]]
    chamfer(chafl_n3_edges, length=CHAFL_N3_SIZE, length2=CHAFL_N3_SIZE2, reference=chafl_n3_side[0])

    # Croquis9 → Cortar-Extruir9 (cut)
    with BuildSketch(Plane(origin=(0, 0, 0), x_dir=(-1, 0, 0), z_dir=(0, 0, -1))):
        with Locations((-64.7, 137.027477477)):
            Circle(CROQUIS9_R)
        with Locations((-40.3, 137.027477477)):
            Circle(CROQUIS9_R)
    extrude(amount=-CORTAR_EXTRUIR9_DEPTH, mode=Mode.SUBTRACT)


solid = part.part
